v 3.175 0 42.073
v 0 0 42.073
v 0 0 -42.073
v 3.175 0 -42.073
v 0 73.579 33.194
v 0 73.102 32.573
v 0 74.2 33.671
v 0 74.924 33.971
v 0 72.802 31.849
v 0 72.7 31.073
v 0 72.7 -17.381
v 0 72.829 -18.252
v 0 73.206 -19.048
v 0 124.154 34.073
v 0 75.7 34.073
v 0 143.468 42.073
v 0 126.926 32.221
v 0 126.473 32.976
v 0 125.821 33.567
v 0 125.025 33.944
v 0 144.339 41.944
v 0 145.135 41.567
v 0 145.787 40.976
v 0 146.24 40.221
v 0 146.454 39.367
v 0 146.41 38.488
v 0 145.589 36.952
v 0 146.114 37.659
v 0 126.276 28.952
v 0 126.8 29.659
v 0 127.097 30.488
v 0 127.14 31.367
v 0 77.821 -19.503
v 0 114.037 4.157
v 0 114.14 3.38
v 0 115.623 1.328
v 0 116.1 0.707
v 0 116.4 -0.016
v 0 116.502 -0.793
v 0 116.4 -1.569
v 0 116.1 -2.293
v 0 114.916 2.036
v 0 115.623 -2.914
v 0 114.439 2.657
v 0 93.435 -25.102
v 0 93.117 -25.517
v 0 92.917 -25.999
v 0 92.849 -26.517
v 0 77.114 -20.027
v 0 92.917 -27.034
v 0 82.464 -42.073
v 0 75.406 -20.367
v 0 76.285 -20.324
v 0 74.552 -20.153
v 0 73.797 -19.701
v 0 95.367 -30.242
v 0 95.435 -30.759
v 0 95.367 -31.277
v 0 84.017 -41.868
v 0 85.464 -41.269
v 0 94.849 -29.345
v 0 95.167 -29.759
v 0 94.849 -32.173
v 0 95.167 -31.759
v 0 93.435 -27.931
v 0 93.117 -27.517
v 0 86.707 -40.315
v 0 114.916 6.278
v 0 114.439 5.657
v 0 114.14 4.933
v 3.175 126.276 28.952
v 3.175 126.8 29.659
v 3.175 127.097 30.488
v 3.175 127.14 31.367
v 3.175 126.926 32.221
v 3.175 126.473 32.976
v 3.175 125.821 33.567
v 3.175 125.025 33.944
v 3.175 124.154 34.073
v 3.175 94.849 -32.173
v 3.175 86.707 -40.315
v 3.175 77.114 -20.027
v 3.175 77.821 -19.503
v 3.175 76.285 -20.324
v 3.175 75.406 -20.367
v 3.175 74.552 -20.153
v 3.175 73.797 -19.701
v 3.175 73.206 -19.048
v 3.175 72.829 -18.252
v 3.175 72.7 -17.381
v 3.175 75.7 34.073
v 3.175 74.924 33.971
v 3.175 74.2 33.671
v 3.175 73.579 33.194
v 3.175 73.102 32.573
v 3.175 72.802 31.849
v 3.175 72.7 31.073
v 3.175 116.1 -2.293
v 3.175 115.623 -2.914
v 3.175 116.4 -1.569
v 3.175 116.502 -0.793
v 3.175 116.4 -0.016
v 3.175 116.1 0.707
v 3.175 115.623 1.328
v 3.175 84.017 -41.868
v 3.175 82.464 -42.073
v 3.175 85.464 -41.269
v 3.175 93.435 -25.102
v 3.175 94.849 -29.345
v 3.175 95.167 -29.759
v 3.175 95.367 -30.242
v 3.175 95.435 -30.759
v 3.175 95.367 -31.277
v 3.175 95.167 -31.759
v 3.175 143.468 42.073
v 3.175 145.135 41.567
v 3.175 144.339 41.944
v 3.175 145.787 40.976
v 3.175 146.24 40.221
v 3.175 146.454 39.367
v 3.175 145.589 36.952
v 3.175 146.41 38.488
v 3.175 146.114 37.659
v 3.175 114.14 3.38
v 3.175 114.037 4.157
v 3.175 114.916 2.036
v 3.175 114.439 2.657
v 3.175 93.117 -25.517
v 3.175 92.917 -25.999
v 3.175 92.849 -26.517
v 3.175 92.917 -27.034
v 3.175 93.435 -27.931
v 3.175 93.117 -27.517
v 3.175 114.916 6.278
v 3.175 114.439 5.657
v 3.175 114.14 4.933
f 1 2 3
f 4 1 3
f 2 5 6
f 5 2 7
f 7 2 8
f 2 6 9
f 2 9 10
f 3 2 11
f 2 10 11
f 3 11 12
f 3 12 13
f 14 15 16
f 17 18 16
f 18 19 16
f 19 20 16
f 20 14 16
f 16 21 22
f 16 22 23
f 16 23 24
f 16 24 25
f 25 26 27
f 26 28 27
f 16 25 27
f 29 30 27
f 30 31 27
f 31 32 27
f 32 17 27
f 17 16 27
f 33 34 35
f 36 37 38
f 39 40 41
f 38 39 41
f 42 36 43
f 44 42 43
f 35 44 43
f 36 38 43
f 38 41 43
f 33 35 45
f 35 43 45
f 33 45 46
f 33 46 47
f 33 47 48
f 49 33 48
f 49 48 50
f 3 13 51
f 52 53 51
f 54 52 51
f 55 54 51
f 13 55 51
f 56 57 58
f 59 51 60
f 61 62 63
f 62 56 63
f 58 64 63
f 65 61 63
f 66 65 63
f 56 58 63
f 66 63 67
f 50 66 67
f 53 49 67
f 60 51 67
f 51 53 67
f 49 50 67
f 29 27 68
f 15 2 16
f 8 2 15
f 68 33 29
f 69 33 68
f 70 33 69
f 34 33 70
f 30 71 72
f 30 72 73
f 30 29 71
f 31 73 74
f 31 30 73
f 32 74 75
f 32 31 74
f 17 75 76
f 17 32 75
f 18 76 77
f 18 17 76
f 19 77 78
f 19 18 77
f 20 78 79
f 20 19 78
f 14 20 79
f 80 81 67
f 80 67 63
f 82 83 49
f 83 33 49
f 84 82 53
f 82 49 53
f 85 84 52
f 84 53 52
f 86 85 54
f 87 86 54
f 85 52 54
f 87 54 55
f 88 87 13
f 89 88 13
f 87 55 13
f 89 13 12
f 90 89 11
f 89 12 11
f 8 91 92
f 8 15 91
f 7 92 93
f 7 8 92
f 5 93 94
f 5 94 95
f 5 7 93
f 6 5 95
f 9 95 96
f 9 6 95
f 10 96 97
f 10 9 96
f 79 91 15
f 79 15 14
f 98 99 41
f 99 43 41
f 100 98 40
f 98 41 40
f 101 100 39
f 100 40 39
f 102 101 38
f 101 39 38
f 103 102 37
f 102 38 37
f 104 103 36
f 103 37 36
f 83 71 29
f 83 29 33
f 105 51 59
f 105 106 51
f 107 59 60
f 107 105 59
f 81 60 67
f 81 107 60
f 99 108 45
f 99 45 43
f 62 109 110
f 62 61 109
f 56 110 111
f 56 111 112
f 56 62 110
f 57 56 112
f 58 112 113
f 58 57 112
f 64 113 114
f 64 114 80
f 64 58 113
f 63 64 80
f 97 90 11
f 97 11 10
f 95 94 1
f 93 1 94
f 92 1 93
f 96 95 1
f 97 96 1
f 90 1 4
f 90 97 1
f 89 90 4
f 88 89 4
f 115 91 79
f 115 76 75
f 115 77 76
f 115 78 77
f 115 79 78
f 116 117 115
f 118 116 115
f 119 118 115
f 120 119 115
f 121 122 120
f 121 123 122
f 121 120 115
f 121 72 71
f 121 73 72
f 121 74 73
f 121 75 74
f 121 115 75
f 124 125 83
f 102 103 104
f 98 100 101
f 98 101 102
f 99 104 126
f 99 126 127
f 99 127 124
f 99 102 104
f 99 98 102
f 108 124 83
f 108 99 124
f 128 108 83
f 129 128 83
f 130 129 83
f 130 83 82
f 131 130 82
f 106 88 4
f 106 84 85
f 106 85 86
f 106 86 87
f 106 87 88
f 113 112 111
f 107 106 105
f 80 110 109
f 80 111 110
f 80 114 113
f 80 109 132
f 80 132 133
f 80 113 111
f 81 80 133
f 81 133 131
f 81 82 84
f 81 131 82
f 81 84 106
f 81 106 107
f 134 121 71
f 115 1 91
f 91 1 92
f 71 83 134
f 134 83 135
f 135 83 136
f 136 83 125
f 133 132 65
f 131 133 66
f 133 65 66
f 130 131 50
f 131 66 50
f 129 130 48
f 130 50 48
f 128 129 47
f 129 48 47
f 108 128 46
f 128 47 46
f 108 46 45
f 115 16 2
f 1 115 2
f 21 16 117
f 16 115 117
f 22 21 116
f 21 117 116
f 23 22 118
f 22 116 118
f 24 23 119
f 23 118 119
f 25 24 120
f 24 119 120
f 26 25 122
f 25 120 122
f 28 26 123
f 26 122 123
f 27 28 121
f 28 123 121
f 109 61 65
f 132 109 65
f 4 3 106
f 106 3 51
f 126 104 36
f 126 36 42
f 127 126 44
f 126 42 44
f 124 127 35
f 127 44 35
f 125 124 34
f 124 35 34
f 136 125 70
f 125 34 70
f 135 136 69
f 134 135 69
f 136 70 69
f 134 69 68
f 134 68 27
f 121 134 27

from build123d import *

# Parameters (mm, degrees)
BOSS_EXTRU_1_DEPTH      = 3.175
CONG_1_R                = 6
CONG_2_R                = 2
ENL_V_MAT_EXTRU_2_DEPTH = 157.50531659973907
CONG_4_R                = 3
BOSS_EXTRU_2_DEPTH      = 3.175
CONG_5_R                = 2
CONG_6_R                = 3


with BuildPart() as part:
    # Esquisse1 → Boss.-Extru.1 (new body)
    with BuildSketch(Plane(origin=(0, 0, 0), x_dir=(0, 0, -1), z_dir=(1, 0, 0))):
        Polygon((-42.0728534805994, 0), (42.0728534805994, 0), (42.072853480599385, 84.94974746830529), (30.759144981614714, 96.26345596728963), (26.516504294495412, 92.02081528017037), (33.58757210636085, 84.94974746830486), (28.637824638054987, 79.99999999999906), (-42.07285348059938, 150.71067811865416), align=None)
    extrude(amount=BOSS_EXTRU_1_DEPTH)

    # Congé1
    cong_1_edges = [part.edges().sort_by_distance(p)[0] for p in [
        (1.5875, 84.94974746830529, -42.072853480599385),
    ]]
    fillet(cong_1_edges, radius=CONG_1_R)

    # Congé2
    cong_2_edges = [part.edges().sort_by_distance(p)[0] for p in [
        (1.5875, 92.02081528017037, -26.516504294495412),
        (1.5875, 96.26345596728963, -30.759144981614714),
    ]]
    fillet(cong_2_edges, radius=CONG_2_R)

    # Esquisse4 → Enlèv. mat.-Extru.2 (cut, through all)
    with BuildSketch(Plane(origin=(3.175, 0, 0), x_dir=(0, 0, -1), z_dir=(1, 0, 0))):
        Polygon((24.62411613906931, 72.7), (-34.07285348059938, 72.69999999999999), (-34.07285348059938, 131.39696961966868), align=None)
    extrude(amount=-ENL_V_MAT_EXTRU_2_DEPTH, mode=Mode.SUBTRACT)

    # Congé4
    cong_4_edges = [part.edges().sort_by_distance(p)[0] for p in [
        (1.5875, 150.71067811865416, 42.07285348059938),
        (1.5875, 131.39696961966868, 34.07285348059938),
        (1.5875, 72.7, -24.62411613906931),
        (1.5875, 72.69999999999999, 34.07285348059938),
    ]]
    fillet(cong_4_edges, radius=CONG_4_R)

    # Esquisse5 → Boss.-Extru.2 (add)
    with BuildSketch(Plane(origin=(3.175, 0, 0), x_dir=(0, 0, -1), z_dir=(1, 0, 0))):
        Polygon((30.759144981614842, 96.26345596728976), (26.51650429449542, 92.02081528017034), (0.7928932188133107, 117.74442635585244), (-4.15685424949237, 112.79467888754677), (28.637824638054987, 79.99999999999906), (37.8302127934801, 89.19238815542445), align=None)
    extrude(amount=-BOSS_EXTRU_2_DEPTH)

    # Congé5
    cong_5_edges = [part.edges().sort_by_distance(p)[0] for p in [
        (1.5875, 96.26345596728976, -30.759144981614842),
        (1.5875, 92.02081528017034, -26.51650429449542),
    ]]
    fillet(cong_5_edges, radius=CONG_5_R)

    # Congé6
    cong_6_edges = [part.edges().sort_by_distance(p)[0] for p in [
        (1.5875, 112.79467888754677, 4.15685424949237),
        (1.5875, 117.74442635585244, -0.7928932188133107),
    ]]
    fillet(cong_6_edges, radius=CONG_6_R)


solid = part.part
